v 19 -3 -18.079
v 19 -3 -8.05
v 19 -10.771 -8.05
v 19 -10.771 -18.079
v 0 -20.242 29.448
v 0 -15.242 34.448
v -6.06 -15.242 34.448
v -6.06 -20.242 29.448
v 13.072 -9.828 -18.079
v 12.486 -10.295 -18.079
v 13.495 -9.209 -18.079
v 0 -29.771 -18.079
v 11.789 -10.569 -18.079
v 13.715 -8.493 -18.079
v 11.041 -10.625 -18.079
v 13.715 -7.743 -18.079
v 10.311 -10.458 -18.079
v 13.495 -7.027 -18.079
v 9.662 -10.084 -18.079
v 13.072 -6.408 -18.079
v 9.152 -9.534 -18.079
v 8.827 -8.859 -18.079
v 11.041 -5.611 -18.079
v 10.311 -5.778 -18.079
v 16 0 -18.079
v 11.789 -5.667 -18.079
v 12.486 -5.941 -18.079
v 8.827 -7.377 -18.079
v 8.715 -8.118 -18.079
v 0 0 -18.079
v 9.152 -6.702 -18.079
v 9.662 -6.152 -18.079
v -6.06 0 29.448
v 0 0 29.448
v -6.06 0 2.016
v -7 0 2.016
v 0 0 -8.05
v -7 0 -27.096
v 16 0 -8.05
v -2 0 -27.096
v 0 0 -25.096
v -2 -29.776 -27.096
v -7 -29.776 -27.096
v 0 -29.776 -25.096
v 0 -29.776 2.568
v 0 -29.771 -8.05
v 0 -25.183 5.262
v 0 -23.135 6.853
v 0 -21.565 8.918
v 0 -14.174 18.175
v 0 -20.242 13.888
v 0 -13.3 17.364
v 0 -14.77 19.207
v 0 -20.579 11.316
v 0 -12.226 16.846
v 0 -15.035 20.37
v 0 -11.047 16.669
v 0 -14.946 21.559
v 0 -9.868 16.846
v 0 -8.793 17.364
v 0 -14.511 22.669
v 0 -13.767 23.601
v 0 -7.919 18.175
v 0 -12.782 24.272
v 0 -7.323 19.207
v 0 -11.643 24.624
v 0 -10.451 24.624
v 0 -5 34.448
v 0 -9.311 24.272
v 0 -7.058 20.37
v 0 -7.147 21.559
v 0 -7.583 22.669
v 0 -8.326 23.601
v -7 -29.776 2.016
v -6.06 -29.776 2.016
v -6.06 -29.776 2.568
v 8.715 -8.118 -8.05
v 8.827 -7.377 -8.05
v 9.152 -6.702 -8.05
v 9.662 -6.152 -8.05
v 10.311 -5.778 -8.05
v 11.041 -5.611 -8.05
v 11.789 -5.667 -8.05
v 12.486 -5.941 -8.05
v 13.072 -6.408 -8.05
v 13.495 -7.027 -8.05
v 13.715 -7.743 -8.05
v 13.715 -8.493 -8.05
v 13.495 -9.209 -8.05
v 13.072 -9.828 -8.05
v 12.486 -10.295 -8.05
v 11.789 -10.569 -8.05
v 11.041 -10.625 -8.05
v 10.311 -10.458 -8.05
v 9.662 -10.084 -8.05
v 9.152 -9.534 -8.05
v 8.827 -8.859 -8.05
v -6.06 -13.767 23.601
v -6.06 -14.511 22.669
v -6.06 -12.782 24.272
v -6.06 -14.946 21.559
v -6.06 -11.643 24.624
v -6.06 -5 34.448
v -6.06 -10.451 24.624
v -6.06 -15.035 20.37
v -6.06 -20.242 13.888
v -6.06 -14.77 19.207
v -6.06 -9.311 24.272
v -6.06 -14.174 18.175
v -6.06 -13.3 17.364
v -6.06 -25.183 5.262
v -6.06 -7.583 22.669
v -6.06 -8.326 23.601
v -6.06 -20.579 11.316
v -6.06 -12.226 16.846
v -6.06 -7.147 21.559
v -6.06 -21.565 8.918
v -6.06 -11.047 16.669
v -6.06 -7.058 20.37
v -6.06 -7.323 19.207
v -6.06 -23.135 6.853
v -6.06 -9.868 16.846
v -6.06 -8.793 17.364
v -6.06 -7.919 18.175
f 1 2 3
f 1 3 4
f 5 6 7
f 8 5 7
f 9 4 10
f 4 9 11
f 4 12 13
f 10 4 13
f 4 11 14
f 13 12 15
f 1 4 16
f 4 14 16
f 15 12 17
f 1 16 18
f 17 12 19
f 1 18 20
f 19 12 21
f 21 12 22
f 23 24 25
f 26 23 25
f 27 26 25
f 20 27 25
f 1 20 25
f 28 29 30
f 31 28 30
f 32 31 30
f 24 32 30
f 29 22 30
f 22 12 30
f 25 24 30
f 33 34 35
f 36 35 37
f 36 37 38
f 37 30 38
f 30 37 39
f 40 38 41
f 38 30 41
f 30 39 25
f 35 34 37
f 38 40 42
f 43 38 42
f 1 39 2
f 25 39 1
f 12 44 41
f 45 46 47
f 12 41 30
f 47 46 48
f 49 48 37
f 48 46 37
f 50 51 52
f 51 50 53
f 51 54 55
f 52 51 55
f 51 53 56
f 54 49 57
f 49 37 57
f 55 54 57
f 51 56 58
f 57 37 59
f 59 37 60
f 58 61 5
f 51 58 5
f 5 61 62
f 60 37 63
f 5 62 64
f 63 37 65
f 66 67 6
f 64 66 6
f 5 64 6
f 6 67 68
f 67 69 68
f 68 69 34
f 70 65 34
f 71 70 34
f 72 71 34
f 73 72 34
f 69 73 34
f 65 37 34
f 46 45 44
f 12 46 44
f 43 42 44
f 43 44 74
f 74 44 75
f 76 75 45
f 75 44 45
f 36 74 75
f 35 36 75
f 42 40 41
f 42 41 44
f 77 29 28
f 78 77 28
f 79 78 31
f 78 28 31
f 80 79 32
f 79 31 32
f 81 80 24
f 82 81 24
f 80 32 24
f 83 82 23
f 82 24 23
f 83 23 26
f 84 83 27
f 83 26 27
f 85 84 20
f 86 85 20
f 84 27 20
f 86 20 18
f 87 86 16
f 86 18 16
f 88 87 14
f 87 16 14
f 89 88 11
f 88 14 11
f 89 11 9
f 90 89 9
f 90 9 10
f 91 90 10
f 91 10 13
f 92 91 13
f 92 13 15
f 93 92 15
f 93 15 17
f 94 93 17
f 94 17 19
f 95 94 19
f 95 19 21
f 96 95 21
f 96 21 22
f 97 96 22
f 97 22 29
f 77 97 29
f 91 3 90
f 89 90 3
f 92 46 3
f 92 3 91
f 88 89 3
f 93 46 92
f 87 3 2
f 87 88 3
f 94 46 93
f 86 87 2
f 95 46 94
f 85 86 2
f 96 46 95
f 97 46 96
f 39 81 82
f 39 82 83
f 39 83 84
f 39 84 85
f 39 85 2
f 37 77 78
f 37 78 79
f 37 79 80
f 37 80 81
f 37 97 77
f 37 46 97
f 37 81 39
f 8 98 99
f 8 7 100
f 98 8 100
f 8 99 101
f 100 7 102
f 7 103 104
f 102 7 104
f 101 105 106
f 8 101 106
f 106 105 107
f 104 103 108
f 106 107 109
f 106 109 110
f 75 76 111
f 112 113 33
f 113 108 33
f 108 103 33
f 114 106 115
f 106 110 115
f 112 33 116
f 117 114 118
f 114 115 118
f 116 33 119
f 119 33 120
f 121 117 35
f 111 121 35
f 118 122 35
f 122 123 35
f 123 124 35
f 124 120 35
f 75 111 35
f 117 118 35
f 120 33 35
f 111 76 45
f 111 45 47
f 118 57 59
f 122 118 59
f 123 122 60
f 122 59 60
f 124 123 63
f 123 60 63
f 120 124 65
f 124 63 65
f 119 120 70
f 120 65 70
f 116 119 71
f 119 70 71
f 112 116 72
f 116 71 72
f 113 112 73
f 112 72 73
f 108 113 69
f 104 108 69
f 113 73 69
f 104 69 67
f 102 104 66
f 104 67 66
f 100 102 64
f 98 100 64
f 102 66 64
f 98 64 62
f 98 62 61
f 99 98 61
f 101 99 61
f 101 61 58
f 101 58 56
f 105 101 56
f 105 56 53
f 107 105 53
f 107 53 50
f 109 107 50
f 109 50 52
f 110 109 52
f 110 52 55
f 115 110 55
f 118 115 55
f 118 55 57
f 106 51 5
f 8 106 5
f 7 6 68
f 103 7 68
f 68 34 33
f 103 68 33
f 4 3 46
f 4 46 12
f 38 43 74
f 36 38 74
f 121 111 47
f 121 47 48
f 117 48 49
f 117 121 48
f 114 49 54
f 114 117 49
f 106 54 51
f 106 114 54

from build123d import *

# Parameters (mm, degrees)
EXTRUDE_1_DEPTH     = 7
FILLET_1_R          = 10
CHAMFER_1_SIZE      = 5
SKETCH_3_W          = 3.25461804
SKETCH_3_H          = 54.107720412
CUT_EXTRUDE_2_DEPTH = 47.067962478
SKETCH_4_R          = 4
CUT_EXTRUDE_3_DEPTH = 47.067962478
SKETCH_5_W          = 10.028686974
SKETCH_5_H          = 29.771176491
EXTRUDE_2_DEPTH     = 19
CHAMFER_3_SIZE      = 19
CHAMFER_4_SIZE      = 3
SKETCH_6_R          = 2.514235327
CUT_EXTRUDE_4_DEPTH = 64.298215394
CHAMFER_5_SIZE      = 2


with BuildPart() as part:
    # Эскиз1 → Вытянуть1 (new body)
    with BuildSketch(Plane(origin=(0, 0, 0), x_dir=(0, 0, -1), z_dir=(1, 0, 0))):
        Polygon((-2.568460462, -29.775860751), (-8.159933039, -20.242473248), (-34.447863263, -20.242473248), (-34.447863263, 0), (27.095667874, 0), (27.095667874, -29.775860751), align=None)
    extrude(amount=-EXTRUDE_1_DEPTH)

    # Скругление1
    fillet_1_edges = [part.edges().sort_by_distance(p)[0] for p in [
        (-3.5, -20.242473248, 8.159933039),
    ]]
    fillet(fillet_1_edges, radius=FILLET_1_R)

    # Фаска1
    chamfer_1_edges = [part.edges().sort_by_distance(p)[0] for p in [
        (-3.5, -20.242473248, 34.447863263),
        (-3.5, 0, 34.447863263),
    ]]
    chamfer(chamfer_1_edges, length=CHAMFER_1_SIZE)

    # Эскиз3 → Вырез-Вытянуть2 (cut, through all)
    with BuildSketch(Plane(origin=(0, 0, 0), x_dir=(1, 0, 0), z_dir=(0, 1, 0))):
        with Locations((-7.6877425, -29.069741347)):
            Rectangle(SKETCH_3_W, SKETCH_3_H)
    extrude(amount=-CUT_EXTRUDE_2_DEPTH, mode=Mode.SUBTRACT)

    # Эскиз4 → Вырез-Вытянуть3 (cut, through all)
    with BuildSketch(Plane(origin=(0, 0, 0), x_dir=(0, 0, -1), z_dir=(1, 0, 0))):
        with Locations((-20.668500614, -11.046677749)):
            Circle(SKETCH_4_R)
    extrude(amount=-CUT_EXTRUDE_3_DEPTH, mode=Mode.SUBTRACT)

    # Эскиз5 → Вытянуть2 (add)
    with BuildSketch(Plane(origin=(0, 0, 0), x_dir=(0, 0, -1), z_dir=(1, 0, 0))):
        with Locations((13.06456917, -14.885588246)):
            Rectangle(SKETCH_5_W, SKETCH_5_H)
    extrude(amount=EXTRUDE_2_DEPTH)

    # Фаска3
    chamfer_3_edges = [part.edges().sort_by_distance(p)[0] for p in [
        (19, -29.771176491, -13.06456917),
    ]]
    chamfer(chamfer_3_edges, length=CHAMFER_3_SIZE - 0.0001)  # a hair under: the kernel refuses the full size

    # Фаска4
    chamfer_4_edges = [part.edges().sort_by_distance(p)[0] for p in [
        (19, 0, -13.06456917),
    ]]
    chamfer(chamfer_4_edges, length=CHAMFER_4_SIZE)

    # Эскиз6 → Вырез-Вытянуть4 (cut, through all)
    with BuildSketch(Plane(origin=(0, 0, -18.078912657), x_dir=(-1, 0, 0), z_dir=(0, 0, -1))):
        with Locations((-11.229341263, -8.118042122)):
            Circle(SKETCH_6_R)
    extrude(amount=-CUT_EXTRUDE_4_DEPTH, mode=Mode.SUBTRACT)

    # Фаска5
    chamfer_5_edges = [part.edges().sort_by_distance(p)[0] for p in [
        (0, -14.887930375, -27.095667874),
    ]]
    chamfer(chamfer_5_edges, length=CHAMFER_5_SIZE)


solid = part.part
